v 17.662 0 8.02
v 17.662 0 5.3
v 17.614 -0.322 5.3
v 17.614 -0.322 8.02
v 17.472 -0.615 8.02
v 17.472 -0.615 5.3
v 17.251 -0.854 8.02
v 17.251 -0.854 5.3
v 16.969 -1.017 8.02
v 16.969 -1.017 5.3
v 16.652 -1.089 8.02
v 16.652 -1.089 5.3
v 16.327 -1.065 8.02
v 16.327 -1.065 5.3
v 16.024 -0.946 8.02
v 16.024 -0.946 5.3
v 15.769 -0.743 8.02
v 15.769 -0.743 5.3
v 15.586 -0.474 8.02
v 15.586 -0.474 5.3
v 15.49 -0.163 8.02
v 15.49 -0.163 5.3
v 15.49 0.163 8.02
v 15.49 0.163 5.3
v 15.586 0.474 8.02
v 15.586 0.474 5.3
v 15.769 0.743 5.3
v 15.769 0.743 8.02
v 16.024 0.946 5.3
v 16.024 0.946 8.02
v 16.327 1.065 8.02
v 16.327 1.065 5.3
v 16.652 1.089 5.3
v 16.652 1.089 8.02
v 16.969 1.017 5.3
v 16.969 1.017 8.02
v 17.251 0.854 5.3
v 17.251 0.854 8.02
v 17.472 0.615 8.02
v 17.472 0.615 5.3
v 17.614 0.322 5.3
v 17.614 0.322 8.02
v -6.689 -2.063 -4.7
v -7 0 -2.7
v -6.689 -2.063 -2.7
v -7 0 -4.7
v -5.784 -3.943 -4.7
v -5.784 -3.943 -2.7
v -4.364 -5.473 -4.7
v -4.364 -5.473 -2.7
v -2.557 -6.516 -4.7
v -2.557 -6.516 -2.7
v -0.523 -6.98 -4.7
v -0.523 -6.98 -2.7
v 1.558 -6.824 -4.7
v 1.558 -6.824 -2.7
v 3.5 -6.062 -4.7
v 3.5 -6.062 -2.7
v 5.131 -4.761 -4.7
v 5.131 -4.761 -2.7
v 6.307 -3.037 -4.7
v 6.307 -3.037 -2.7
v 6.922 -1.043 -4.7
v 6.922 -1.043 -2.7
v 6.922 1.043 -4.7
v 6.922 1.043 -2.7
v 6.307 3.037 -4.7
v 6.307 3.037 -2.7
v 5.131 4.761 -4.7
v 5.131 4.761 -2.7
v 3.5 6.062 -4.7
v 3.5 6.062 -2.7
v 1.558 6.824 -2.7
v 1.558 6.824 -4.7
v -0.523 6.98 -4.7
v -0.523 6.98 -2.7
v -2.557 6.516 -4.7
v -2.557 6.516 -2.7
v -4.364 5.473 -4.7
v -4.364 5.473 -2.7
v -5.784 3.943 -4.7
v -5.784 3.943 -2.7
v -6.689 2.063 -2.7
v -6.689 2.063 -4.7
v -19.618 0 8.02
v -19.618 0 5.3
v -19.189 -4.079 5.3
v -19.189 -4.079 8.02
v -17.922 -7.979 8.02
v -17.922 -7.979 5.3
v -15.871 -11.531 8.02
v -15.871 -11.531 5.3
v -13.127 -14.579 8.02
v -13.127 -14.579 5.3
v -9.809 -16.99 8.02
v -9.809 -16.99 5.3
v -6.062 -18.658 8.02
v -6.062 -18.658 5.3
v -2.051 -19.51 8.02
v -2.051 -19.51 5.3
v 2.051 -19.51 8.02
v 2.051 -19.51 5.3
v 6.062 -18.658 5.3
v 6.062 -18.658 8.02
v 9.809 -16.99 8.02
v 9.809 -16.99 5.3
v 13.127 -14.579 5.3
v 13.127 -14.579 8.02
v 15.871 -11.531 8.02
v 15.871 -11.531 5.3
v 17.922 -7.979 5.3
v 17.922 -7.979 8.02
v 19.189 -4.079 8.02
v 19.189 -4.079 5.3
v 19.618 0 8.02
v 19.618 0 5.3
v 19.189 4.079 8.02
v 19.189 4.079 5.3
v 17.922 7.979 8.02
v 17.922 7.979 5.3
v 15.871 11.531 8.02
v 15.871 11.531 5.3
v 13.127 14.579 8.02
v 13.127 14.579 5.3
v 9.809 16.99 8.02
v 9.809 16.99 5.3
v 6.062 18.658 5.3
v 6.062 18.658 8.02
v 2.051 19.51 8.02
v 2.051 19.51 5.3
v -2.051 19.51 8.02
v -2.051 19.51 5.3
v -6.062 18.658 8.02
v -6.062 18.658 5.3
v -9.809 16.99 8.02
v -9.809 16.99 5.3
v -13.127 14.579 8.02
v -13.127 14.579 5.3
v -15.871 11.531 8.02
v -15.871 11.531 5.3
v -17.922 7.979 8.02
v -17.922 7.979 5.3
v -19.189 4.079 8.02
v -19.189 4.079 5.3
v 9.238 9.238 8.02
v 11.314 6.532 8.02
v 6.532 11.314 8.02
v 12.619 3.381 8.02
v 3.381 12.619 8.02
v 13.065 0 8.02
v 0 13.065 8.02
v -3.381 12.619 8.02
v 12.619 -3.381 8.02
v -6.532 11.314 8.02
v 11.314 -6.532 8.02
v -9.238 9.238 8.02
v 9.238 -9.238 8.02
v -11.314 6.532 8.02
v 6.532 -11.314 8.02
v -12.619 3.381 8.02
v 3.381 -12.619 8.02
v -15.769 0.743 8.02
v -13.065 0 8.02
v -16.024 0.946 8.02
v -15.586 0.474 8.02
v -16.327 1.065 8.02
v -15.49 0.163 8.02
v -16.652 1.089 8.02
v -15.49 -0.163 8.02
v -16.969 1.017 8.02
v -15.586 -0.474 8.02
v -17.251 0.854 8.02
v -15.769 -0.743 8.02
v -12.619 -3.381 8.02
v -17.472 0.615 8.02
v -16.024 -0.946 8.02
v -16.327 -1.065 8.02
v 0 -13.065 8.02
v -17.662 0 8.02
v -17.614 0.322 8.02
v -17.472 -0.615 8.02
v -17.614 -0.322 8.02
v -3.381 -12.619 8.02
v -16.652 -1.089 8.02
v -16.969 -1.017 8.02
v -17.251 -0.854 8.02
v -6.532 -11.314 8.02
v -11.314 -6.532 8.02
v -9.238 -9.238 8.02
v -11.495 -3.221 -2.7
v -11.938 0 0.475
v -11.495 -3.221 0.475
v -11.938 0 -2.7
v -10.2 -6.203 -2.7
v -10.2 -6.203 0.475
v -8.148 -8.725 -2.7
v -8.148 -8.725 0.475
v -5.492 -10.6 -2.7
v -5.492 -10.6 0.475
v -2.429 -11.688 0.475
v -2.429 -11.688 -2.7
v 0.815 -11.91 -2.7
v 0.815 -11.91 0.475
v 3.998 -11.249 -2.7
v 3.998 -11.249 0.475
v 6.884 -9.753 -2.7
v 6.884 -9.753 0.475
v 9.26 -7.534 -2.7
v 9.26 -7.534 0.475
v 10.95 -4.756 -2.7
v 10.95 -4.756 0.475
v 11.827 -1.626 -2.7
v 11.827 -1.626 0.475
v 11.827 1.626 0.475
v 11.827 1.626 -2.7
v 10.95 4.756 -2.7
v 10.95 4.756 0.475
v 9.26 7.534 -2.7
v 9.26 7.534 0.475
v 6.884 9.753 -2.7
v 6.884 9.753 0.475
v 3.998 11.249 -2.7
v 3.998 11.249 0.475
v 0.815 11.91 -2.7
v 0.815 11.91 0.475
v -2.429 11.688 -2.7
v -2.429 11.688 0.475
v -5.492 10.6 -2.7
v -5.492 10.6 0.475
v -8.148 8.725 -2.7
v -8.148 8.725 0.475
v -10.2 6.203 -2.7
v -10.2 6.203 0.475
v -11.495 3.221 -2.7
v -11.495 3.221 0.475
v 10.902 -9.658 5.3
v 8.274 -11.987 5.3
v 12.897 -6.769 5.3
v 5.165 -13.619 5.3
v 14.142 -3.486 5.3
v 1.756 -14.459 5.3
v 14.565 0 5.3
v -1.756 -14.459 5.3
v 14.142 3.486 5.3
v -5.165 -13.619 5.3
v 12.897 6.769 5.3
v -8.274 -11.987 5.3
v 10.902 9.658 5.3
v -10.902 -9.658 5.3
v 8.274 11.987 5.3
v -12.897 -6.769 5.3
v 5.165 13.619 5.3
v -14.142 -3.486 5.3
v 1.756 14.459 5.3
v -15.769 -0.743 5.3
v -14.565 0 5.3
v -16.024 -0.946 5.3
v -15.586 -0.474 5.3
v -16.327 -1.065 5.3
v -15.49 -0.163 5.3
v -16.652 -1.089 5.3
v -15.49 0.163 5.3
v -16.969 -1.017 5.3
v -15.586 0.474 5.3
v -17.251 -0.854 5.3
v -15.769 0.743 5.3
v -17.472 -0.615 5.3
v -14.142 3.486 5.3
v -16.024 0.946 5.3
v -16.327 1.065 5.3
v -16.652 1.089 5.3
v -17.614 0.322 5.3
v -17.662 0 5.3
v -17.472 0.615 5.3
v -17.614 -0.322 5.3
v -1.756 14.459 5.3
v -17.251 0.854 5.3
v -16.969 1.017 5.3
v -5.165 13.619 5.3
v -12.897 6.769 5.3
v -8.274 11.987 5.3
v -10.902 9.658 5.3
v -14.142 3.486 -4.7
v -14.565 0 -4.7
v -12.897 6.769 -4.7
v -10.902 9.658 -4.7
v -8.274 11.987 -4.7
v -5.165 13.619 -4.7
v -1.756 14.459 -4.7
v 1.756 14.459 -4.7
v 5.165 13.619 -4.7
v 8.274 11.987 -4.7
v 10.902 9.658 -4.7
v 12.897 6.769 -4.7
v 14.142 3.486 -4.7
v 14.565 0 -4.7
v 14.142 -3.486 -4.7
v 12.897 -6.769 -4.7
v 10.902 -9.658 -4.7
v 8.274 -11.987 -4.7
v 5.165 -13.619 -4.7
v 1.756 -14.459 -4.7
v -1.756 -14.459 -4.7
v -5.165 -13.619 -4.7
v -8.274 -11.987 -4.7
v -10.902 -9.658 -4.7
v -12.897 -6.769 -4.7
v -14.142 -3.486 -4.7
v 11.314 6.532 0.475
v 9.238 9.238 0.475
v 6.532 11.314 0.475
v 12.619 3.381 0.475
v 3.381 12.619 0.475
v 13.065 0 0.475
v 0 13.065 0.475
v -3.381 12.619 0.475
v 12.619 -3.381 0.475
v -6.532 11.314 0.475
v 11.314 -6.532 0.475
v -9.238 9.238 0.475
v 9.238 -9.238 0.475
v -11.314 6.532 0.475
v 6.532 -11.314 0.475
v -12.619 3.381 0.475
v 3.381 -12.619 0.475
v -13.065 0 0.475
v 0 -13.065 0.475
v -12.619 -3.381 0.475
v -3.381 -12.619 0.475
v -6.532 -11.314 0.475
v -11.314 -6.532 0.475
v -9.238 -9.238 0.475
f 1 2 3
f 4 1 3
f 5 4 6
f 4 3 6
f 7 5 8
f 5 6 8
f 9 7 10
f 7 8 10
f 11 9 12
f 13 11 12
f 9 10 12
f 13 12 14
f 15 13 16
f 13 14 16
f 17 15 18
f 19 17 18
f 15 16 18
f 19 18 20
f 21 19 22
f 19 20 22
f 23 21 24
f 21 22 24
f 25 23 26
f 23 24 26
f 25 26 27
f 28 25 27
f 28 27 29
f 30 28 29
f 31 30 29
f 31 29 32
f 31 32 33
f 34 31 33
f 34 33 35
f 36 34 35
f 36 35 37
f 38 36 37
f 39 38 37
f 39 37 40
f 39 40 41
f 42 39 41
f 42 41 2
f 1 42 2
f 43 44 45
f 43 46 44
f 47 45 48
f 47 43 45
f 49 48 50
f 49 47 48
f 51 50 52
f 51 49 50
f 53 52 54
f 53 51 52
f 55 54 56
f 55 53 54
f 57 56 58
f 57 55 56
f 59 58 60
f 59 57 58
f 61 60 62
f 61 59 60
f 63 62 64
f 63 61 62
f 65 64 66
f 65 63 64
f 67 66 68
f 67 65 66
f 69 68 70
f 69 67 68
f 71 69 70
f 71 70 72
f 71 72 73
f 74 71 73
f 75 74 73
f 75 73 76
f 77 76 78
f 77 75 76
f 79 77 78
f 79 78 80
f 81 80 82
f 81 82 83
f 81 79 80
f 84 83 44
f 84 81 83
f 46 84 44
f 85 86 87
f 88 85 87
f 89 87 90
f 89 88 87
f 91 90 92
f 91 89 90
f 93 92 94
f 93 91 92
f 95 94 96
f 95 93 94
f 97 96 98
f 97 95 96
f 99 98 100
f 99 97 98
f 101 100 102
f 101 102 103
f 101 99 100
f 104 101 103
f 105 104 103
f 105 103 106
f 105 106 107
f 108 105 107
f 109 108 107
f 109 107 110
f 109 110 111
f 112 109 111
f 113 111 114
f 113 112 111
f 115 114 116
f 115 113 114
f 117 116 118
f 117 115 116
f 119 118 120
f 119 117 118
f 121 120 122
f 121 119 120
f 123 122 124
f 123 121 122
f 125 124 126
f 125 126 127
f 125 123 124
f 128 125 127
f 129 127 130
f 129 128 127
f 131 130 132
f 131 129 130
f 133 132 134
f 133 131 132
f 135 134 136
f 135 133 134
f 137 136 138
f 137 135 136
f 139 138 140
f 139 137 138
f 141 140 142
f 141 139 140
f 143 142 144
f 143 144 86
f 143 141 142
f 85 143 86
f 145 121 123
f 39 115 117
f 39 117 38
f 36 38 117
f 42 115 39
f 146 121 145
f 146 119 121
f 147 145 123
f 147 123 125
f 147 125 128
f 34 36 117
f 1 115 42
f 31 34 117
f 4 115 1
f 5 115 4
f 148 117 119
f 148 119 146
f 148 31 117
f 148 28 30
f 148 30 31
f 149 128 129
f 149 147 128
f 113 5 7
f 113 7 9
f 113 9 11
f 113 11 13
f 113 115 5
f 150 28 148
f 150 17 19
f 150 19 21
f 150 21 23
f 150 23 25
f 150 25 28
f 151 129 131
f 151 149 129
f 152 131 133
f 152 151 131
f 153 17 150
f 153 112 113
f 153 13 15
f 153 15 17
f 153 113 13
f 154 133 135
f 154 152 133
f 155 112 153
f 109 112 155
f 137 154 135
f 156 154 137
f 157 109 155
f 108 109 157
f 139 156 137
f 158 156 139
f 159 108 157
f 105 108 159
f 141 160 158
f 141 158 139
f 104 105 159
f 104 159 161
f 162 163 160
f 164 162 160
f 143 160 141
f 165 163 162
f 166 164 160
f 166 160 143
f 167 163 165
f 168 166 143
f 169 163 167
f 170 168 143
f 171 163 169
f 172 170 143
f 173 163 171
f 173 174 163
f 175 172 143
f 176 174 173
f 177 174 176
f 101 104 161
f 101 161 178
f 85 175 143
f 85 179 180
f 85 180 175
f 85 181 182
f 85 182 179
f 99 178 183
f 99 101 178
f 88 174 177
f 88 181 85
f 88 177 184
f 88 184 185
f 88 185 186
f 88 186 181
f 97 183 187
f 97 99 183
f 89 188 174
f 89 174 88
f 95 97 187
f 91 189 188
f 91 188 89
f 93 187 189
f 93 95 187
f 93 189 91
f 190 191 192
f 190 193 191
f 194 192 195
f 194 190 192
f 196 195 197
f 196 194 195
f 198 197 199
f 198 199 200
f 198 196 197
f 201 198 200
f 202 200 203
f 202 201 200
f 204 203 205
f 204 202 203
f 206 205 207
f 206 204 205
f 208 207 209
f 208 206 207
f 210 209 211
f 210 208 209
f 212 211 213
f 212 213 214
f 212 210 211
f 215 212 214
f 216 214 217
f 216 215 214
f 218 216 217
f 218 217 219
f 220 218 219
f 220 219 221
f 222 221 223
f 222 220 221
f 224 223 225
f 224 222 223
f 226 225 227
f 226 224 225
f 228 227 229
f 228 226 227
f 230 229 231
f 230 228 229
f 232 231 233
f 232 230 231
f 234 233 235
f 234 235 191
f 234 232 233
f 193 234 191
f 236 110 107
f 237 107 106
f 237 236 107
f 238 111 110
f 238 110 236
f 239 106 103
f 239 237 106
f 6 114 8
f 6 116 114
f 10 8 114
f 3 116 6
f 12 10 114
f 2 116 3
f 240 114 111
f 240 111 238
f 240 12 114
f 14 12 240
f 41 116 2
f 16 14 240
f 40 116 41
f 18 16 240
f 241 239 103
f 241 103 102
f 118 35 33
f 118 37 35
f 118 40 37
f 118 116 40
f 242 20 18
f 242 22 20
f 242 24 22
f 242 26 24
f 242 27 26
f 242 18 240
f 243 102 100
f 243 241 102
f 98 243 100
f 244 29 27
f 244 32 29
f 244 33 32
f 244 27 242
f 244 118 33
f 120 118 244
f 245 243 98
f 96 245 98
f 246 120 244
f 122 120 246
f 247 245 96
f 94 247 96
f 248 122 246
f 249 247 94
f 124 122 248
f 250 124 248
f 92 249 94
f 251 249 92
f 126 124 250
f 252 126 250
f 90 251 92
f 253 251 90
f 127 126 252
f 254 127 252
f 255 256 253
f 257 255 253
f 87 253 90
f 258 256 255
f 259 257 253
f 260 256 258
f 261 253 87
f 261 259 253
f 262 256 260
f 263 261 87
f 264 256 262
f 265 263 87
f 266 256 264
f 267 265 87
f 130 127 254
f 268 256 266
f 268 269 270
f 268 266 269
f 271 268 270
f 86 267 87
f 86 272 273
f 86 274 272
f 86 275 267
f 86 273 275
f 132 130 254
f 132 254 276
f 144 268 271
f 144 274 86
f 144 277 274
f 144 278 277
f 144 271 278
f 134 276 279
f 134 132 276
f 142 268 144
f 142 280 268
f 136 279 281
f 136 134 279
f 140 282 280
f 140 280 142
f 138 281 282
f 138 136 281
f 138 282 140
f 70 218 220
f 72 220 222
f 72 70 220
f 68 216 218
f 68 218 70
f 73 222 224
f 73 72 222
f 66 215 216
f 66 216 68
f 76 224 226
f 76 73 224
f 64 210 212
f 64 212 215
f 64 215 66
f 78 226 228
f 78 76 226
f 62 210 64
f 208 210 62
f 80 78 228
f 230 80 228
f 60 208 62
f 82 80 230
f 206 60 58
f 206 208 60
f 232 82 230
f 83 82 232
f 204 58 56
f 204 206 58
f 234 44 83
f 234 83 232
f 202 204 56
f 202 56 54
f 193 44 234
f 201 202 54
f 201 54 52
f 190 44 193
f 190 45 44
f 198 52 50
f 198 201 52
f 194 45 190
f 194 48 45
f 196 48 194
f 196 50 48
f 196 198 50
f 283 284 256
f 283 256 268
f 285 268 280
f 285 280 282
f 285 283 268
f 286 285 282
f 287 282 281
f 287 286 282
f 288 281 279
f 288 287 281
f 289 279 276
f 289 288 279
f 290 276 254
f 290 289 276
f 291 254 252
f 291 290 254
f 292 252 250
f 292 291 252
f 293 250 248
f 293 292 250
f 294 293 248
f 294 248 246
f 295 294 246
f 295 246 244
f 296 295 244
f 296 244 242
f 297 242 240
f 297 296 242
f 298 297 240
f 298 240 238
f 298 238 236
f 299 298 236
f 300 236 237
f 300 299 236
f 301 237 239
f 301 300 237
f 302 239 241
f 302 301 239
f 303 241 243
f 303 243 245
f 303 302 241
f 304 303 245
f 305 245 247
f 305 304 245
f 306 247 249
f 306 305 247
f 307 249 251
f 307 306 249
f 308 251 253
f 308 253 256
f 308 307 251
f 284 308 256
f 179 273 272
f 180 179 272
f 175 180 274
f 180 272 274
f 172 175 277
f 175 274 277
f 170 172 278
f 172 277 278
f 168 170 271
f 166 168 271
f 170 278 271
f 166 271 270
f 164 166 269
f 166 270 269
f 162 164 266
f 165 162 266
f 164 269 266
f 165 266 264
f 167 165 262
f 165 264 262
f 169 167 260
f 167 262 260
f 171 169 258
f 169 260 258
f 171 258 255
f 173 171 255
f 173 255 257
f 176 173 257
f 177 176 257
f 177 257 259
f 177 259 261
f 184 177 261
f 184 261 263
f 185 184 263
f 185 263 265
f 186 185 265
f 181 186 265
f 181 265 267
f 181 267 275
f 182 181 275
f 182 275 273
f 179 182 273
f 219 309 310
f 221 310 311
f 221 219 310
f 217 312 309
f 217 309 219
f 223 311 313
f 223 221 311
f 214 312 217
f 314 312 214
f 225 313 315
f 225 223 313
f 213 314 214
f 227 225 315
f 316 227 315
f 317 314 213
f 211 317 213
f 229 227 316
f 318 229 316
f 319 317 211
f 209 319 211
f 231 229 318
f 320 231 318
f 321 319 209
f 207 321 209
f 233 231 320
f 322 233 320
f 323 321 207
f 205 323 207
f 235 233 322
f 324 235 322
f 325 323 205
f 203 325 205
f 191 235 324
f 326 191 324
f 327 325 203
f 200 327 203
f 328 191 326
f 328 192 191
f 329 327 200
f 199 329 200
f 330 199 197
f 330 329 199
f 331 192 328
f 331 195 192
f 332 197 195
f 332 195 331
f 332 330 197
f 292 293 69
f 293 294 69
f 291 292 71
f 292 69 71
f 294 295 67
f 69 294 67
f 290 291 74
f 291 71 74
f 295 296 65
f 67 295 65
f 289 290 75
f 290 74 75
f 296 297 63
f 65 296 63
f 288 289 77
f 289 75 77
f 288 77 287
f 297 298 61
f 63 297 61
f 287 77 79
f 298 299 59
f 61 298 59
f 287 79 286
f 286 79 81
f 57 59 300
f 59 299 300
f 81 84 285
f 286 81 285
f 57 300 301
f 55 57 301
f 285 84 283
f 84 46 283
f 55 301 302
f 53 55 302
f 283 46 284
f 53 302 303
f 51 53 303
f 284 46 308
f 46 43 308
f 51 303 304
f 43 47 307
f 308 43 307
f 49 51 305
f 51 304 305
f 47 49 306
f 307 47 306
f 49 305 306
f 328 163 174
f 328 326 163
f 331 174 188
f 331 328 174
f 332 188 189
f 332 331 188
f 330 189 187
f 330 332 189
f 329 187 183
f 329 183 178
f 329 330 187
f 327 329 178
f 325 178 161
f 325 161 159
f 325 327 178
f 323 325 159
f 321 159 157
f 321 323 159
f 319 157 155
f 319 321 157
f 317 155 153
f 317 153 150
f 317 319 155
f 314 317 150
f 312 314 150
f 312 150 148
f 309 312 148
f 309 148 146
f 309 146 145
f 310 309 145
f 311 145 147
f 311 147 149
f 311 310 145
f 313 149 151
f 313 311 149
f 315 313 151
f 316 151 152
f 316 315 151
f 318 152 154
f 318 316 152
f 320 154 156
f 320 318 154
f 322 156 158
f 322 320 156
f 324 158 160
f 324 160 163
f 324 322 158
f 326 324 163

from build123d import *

# Parameters (mm, degrees)
SKETCH1_W          = 12.617819502
SKETCH1_H          = 2
SKETCH1_W_2        = 6.5532
SKETCH1_H_2        = 7.545
SKETCH2_R          = 26.652766262
SKETCH2_R_2        = 14.565
CUT_EXTRUDE1_DEPTH = 10
SKETCH4_R          = 1.0922
CUT_EXTRUDE2_DEPTH = 30.490976315


with BuildPart() as part:
    # Sketch1 → Revolve1 (revolve)
    with BuildSketch(Plane(origin=(0, 0, 0), x_dir=(1, 0, 0), z_dir=(0, 1, 0))):
        with Locations((-13.308909751, 3.700473465)):
            Rectangle(SKETCH1_W, SKETCH1_H)
        Polygon((-11.938, 2.700473465), (-19.617819502, 2.700473465), (-19.617819502, -0.474526535), (-13.064619502, -0.474526535), (-11.938, -0.474526535), align=None)
        with Locations((-16.341219502, -4.247026535)):
            Rectangle(SKETCH1_W_2, SKETCH1_H_2)
    revolve(axis=Axis((0, 0, -25.411285606), (0, 0, 1)))

    # Sketch2 → Cut-Extrude1 (cut)
    with BuildSketch(Plane(origin=(0, 0, -4.700473465), x_dir=(-1, 0, 0), z_dir=(0, 0, -1))):
        Circle(SKETCH2_R)
        Circle(SKETCH2_R_2, mode=Mode.SUBTRACT)
    extrude(amount=-CUT_EXTRUDE1_DEPTH, mode=Mode.SUBTRACT)

    # Sketch4 → Cut-Extrude2 (cut, through all)
    with BuildSketch(Plane(origin=(0, 0, 5.299526535), x_dir=(-1, 0, 0), z_dir=(0, 0, -1))):
        with Locations((16.57, 0)):
            Circle(SKETCH4_R)
        with Locations(Location((-16.57, 0, 0), (0, 0, 180))):
            Circle(SKETCH4_R)
    extrude(amount=-CUT_EXTRUDE2_DEPTH, mode=Mode.SUBTRACT)


solid = part.part
